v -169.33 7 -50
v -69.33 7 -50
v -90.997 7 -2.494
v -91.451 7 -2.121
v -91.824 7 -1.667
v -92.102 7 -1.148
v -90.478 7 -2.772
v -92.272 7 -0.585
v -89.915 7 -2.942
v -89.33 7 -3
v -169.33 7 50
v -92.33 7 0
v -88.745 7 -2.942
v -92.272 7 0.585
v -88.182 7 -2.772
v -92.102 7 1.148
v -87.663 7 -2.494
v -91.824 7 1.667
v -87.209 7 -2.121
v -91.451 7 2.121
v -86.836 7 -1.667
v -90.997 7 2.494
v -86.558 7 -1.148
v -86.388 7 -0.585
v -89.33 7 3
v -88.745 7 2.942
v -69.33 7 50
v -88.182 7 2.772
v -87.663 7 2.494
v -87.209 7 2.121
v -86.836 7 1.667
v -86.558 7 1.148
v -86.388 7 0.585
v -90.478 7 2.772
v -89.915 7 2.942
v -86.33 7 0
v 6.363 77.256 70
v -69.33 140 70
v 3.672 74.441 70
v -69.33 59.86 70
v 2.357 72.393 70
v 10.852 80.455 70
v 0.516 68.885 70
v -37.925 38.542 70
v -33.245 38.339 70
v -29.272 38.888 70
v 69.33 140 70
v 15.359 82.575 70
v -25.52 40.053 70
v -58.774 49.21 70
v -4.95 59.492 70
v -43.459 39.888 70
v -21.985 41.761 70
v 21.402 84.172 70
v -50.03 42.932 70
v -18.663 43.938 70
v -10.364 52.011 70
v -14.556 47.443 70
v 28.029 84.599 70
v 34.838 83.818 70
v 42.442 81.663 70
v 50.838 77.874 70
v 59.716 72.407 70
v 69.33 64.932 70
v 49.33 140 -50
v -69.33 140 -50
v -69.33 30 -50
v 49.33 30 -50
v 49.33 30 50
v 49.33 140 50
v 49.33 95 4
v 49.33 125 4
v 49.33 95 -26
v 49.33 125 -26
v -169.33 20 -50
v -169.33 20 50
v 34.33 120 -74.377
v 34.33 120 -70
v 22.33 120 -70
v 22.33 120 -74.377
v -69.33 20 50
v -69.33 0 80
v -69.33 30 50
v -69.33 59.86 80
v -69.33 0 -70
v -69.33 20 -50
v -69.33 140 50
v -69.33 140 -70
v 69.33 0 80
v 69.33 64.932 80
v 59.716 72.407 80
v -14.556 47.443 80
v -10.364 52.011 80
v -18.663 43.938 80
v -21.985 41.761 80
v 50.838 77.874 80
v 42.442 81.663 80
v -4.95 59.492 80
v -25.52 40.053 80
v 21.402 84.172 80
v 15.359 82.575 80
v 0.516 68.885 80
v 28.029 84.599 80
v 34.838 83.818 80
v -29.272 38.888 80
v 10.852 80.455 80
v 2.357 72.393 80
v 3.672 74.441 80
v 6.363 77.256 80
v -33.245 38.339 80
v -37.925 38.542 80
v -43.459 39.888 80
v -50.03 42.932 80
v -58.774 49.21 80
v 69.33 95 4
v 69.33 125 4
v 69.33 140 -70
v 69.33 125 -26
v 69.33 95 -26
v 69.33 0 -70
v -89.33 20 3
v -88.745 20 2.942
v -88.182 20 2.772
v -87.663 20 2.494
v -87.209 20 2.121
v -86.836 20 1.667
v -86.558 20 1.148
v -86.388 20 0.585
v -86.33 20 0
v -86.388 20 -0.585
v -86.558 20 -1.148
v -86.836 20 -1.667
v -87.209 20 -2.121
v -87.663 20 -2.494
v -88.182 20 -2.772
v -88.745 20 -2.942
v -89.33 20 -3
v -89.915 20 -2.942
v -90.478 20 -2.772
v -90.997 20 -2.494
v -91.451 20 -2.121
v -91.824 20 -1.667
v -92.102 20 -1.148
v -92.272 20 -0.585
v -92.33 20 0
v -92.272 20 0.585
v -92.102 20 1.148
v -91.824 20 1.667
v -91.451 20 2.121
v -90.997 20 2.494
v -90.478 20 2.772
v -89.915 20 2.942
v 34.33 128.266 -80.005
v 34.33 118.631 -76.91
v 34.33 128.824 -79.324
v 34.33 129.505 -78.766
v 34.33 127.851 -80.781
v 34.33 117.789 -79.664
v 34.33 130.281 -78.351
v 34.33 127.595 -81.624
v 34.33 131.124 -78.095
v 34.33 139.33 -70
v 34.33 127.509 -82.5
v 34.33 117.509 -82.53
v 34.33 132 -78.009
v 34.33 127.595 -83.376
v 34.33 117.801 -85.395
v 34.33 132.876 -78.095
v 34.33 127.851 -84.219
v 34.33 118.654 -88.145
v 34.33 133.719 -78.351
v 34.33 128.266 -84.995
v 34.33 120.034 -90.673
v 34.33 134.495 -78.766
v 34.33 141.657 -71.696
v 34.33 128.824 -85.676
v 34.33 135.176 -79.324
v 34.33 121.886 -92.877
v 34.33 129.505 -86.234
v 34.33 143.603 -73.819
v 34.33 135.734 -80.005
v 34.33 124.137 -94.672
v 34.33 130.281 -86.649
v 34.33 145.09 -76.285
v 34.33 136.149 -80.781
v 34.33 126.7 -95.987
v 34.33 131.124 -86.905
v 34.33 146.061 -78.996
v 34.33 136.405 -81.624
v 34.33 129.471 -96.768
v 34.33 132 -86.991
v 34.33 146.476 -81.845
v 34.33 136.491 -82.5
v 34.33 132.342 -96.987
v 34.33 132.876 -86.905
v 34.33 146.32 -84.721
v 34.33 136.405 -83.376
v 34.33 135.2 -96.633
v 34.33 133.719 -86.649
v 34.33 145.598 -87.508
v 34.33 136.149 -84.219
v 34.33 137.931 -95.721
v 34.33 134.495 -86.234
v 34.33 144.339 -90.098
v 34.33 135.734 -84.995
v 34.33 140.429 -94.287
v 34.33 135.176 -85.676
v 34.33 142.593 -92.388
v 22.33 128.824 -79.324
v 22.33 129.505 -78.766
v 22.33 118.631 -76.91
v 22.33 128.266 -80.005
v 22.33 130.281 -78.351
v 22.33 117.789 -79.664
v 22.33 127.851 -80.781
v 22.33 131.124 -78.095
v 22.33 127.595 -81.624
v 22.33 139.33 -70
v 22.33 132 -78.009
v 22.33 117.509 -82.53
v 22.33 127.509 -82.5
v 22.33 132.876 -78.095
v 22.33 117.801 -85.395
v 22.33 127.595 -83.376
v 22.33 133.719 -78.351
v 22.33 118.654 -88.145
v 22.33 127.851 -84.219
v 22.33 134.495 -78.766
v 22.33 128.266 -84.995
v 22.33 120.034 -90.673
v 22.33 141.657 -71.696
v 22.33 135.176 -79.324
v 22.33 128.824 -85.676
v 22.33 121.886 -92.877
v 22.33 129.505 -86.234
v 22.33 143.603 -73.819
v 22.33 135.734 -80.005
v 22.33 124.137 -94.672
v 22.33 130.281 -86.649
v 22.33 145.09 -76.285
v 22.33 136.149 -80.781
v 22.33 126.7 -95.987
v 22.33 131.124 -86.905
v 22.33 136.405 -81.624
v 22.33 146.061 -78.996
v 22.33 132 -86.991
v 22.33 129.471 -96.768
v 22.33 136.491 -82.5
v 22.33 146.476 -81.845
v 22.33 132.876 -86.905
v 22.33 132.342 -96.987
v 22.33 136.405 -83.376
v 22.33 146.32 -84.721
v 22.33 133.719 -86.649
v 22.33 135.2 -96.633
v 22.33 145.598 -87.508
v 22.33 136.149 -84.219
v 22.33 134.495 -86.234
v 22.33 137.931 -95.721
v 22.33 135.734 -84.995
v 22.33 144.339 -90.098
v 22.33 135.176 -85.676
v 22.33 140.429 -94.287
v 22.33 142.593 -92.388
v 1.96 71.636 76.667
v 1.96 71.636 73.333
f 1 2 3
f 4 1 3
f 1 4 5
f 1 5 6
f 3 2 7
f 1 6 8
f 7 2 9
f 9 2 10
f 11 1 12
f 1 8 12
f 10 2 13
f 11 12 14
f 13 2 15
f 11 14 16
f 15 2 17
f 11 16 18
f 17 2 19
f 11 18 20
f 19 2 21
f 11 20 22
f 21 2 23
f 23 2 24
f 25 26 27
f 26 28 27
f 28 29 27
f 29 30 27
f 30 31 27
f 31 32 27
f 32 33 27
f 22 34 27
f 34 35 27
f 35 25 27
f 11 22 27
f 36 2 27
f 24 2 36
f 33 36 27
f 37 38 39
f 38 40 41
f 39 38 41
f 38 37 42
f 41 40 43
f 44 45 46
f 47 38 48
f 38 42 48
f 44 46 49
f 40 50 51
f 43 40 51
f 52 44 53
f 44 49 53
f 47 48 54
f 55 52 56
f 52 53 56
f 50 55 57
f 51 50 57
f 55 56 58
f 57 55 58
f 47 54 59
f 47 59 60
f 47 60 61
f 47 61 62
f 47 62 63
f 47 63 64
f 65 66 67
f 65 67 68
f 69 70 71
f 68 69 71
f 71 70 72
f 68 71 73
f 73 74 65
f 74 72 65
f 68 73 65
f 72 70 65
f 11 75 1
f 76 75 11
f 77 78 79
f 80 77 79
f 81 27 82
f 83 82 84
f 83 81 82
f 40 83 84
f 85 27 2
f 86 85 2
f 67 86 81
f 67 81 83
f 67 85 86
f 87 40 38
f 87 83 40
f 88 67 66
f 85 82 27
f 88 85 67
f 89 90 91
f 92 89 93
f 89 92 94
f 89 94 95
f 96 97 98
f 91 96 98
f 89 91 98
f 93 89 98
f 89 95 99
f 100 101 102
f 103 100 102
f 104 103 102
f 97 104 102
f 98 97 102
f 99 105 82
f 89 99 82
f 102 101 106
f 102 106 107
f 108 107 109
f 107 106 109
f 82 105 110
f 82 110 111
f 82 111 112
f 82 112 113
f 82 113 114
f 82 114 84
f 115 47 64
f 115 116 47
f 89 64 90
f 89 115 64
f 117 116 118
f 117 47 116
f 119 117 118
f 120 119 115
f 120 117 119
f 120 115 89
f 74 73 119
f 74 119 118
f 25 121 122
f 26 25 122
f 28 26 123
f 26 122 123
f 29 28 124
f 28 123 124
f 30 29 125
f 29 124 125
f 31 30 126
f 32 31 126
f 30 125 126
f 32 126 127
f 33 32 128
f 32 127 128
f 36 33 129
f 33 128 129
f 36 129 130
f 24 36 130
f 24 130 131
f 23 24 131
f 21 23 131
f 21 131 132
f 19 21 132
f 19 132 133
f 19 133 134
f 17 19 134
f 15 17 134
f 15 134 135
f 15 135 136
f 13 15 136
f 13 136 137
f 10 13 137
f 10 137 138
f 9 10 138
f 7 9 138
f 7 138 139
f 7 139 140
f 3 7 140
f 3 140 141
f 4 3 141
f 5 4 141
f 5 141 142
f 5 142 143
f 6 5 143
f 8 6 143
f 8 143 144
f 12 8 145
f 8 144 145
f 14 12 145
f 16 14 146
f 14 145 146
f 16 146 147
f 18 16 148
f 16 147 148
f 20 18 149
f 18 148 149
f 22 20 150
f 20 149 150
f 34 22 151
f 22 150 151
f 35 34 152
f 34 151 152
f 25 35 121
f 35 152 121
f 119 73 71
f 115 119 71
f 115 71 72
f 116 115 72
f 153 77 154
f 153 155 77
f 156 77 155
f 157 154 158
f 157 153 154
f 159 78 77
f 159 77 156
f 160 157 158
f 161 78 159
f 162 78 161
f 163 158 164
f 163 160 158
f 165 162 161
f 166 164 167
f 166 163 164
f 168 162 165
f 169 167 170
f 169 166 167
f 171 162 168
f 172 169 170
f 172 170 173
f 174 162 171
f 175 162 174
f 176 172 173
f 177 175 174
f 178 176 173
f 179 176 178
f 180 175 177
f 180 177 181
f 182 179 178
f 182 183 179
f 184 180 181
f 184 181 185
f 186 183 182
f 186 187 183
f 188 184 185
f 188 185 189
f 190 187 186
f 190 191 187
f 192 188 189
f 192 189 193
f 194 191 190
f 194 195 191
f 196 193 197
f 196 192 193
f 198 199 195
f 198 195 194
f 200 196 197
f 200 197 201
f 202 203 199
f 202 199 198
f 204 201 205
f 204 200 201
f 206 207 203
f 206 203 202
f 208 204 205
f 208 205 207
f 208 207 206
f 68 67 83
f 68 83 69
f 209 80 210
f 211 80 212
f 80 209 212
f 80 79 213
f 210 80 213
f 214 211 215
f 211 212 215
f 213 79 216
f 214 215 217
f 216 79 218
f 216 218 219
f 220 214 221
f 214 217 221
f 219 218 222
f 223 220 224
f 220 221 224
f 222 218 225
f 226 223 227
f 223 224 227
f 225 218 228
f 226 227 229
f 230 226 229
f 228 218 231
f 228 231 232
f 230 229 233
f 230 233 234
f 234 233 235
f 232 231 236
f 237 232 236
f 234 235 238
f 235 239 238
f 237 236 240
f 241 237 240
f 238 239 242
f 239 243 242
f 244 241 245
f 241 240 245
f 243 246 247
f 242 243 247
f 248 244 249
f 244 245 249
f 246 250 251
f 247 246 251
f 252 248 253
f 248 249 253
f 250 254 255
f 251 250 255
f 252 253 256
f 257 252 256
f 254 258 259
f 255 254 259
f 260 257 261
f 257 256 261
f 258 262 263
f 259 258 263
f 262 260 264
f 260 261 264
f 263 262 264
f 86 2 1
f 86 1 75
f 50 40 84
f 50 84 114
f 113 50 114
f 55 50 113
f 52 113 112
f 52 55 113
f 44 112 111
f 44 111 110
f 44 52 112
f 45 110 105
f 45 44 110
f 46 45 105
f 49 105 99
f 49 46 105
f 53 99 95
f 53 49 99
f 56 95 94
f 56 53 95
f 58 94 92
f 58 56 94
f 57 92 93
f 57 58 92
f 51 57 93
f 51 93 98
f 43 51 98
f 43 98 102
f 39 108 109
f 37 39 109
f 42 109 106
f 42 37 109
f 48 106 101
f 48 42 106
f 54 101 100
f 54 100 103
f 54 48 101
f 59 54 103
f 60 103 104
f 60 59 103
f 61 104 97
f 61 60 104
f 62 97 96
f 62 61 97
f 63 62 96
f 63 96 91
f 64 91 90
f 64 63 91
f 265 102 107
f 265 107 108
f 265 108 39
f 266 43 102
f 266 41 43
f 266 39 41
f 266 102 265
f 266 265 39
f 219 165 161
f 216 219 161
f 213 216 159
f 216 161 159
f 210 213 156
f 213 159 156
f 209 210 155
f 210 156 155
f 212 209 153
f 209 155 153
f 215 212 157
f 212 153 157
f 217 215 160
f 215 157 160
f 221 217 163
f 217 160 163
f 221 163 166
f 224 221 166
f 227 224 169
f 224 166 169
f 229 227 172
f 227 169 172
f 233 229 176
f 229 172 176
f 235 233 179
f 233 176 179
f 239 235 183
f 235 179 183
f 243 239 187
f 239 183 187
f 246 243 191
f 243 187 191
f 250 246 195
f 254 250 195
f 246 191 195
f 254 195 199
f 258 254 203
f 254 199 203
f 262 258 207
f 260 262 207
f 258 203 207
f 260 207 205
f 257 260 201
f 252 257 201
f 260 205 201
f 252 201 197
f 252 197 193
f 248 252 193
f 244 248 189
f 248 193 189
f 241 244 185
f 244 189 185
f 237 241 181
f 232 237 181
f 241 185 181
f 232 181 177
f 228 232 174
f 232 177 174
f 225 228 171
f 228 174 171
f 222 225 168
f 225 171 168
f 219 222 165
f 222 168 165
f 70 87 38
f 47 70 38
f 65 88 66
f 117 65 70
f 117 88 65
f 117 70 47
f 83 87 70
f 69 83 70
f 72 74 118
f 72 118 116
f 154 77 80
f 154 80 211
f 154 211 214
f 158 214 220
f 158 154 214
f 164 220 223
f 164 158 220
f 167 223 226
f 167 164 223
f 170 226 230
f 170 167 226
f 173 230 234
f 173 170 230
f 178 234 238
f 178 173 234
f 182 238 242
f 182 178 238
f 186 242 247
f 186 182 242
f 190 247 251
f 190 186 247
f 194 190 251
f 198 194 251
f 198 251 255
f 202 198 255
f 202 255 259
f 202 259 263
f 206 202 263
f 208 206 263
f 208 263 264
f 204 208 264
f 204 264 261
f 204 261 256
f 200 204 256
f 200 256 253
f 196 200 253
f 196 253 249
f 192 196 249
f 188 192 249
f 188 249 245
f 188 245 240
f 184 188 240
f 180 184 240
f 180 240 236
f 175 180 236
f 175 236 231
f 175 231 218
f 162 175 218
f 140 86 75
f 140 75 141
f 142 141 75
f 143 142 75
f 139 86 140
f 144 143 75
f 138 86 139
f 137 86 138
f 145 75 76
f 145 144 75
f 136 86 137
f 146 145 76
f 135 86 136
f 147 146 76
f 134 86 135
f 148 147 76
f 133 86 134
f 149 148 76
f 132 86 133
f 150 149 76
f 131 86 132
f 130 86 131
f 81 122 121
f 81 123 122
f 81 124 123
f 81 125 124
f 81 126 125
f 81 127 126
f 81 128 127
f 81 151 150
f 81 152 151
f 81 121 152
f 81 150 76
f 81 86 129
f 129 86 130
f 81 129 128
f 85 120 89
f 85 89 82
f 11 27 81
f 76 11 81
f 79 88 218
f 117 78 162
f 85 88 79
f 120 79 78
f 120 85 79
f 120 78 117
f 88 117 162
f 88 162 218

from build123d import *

# Parameters (mm, degrees)
SKETCH_1_W          = 138.66
SKETCH_1_H          = 140
EXTRUDE_1_DEPTH     = 140
SKETCH_2_W          = 118.66
SKETCH_2_H          = 100
CUT_EXTRUDE_1_DEPTH = 110
SKETCH_3_W          = 100
SKETCH_3_H          = 13
EXTRUDE_2_DEPTH     = 100
SKETCH_4_R          = 3
CUT_EXTRUDE_3_DEPTH = 220.026594047
SKETCH_5_W          = 12
SKETCH_5_H          = 12
EXTRUDE_3_DEPTH     = 10
SKETCH_6_R          = 14.490887282
SKETCH_6_R_2        = 4.490887282
EXTRUDE_2_2_DEPTH   = 12
SKETCH_7_R          = 4.490887282
CUT_EXTRUDE_4_DEPTH = 269.968786056
EXTRUDE_4_DEPTH     = 10
SKETCH_10_W         = 30
SKETCH_10_H         = 30
CUT_EXTRUDE_6_DEPTH = 40


with BuildPart() as part:
    # 草圖1 → 填料-伸長1 (new body)
    with BuildSketch(Plane(origin=(0, 0, 0), x_dir=(1, 0, 0), z_dir=(0, 1, 0))):
        Rectangle(SKETCH_1_W, SKETCH_1_H)
    extrude(amount=EXTRUDE_1_DEPTH)

    # 草圖2 → 除料-伸長1 (cut)
    with BuildSketch(Plane(origin=(0, 140, 0), x_dir=(1, 0, 0), z_dir=(0, 1, 0))):
        with Locations((-10, 0)):
            Rectangle(SKETCH_2_W, SKETCH_2_H)
    extrude(amount=-CUT_EXTRUDE_1_DEPTH, mode=Mode.SUBTRACT)

    # 草圖3 → Extrude 2 (add)
    with BuildSketch(Plane.ZY.offset(69.33)):
        with Locations((0, 13.5)):
            Rectangle(SKETCH_3_W, SKETCH_3_H)
    extrude(amount=EXTRUDE_2_DEPTH)

    # 草圖4 → 除料-伸長3 (cut, through all)
    with BuildSketch(Plane(origin=(0, 20, 0), x_dir=(1, 0, 0), z_dir=(0, 1, 0))):
        with Locations(Location((-89.33, 0, 0), (0, 0, 270))):
            Circle(SKETCH_4_R)
    extrude(amount=-CUT_EXTRUDE_3_DEPTH, mode=Mode.SUBTRACT)

    # 草圖5 → 填料-伸長3 (add)
    with BuildSketch(Plane(origin=(0, 0, -70), x_dir=(-1, 0, 0), z_dir=(0, 0, -1))):
        with Locations((-28.33, 126)):
            Rectangle(SKETCH_5_W, SKETCH_5_H)
    extrude(amount=EXTRUDE_3_DEPTH)

    # 草圖6 → Extrude 2 2 (add)
    with BuildSketch(Plane(origin=(34.33, 0, 0), x_dir=(0, 0, -1), z_dir=(1, 0, 0))):
        with Locations((82.5, 132)):
            Circle(SKETCH_6_R)
        with Locations((82.5, 132)):
            Circle(SKETCH_6_R_2, mode=Mode.SUBTRACT)
    extrude(amount=-EXTRUDE_2_2_DEPTH)

    # 草圖7 → 除料-伸長4 (cut, through all)
    with BuildSketch(Plane(origin=(34.33, 0, 0), x_dir=(0, 0, -1), z_dir=(1, 0, 0))):
        with Locations((82.5, 132)):
            Circle(SKETCH_7_R)
    extrude(amount=-CUT_EXTRUDE_4_DEPTH, mode=Mode.SUBTRACT)

    # 草圖8 → 填料-伸長4 (add)
    with BuildSketch(Plane.XY.offset(70)):
        with BuildLine():
            Line((69.33, 64.932058031), (69.33, 0))
            Line((69.33, 0), (-69.33, 0))
            Line((-69.33, 0), (-69.33, 59.86))
            add(Edge.make_bspline(
                [(-69.33, 59.86), (-30.324326289, 14.723815627), (-7.370352849, 53.302477249), (5.662490983, 78.887059451), (32.075816325, 96.876157593), (69.33, 64.932058031)],
                knots=[0, 0, 0, 0, 0.759134607, 0.799849306, 1, 1, 1, 1], degree=3))
        make_face()
    extrude(amount=EXTRUDE_4_DEPTH)

    # 草圖10 → 除料-伸長6 (cut)
    with BuildSketch(Plane.ZY.offset(-49.33)):
        with Locations((-11, 110)):
            Rectangle(SKETCH_10_W, SKETCH_10_H)
    extrude(amount=-CUT_EXTRUDE_6_DEPTH, mode=Mode.SUBTRACT)


solid = part.part
